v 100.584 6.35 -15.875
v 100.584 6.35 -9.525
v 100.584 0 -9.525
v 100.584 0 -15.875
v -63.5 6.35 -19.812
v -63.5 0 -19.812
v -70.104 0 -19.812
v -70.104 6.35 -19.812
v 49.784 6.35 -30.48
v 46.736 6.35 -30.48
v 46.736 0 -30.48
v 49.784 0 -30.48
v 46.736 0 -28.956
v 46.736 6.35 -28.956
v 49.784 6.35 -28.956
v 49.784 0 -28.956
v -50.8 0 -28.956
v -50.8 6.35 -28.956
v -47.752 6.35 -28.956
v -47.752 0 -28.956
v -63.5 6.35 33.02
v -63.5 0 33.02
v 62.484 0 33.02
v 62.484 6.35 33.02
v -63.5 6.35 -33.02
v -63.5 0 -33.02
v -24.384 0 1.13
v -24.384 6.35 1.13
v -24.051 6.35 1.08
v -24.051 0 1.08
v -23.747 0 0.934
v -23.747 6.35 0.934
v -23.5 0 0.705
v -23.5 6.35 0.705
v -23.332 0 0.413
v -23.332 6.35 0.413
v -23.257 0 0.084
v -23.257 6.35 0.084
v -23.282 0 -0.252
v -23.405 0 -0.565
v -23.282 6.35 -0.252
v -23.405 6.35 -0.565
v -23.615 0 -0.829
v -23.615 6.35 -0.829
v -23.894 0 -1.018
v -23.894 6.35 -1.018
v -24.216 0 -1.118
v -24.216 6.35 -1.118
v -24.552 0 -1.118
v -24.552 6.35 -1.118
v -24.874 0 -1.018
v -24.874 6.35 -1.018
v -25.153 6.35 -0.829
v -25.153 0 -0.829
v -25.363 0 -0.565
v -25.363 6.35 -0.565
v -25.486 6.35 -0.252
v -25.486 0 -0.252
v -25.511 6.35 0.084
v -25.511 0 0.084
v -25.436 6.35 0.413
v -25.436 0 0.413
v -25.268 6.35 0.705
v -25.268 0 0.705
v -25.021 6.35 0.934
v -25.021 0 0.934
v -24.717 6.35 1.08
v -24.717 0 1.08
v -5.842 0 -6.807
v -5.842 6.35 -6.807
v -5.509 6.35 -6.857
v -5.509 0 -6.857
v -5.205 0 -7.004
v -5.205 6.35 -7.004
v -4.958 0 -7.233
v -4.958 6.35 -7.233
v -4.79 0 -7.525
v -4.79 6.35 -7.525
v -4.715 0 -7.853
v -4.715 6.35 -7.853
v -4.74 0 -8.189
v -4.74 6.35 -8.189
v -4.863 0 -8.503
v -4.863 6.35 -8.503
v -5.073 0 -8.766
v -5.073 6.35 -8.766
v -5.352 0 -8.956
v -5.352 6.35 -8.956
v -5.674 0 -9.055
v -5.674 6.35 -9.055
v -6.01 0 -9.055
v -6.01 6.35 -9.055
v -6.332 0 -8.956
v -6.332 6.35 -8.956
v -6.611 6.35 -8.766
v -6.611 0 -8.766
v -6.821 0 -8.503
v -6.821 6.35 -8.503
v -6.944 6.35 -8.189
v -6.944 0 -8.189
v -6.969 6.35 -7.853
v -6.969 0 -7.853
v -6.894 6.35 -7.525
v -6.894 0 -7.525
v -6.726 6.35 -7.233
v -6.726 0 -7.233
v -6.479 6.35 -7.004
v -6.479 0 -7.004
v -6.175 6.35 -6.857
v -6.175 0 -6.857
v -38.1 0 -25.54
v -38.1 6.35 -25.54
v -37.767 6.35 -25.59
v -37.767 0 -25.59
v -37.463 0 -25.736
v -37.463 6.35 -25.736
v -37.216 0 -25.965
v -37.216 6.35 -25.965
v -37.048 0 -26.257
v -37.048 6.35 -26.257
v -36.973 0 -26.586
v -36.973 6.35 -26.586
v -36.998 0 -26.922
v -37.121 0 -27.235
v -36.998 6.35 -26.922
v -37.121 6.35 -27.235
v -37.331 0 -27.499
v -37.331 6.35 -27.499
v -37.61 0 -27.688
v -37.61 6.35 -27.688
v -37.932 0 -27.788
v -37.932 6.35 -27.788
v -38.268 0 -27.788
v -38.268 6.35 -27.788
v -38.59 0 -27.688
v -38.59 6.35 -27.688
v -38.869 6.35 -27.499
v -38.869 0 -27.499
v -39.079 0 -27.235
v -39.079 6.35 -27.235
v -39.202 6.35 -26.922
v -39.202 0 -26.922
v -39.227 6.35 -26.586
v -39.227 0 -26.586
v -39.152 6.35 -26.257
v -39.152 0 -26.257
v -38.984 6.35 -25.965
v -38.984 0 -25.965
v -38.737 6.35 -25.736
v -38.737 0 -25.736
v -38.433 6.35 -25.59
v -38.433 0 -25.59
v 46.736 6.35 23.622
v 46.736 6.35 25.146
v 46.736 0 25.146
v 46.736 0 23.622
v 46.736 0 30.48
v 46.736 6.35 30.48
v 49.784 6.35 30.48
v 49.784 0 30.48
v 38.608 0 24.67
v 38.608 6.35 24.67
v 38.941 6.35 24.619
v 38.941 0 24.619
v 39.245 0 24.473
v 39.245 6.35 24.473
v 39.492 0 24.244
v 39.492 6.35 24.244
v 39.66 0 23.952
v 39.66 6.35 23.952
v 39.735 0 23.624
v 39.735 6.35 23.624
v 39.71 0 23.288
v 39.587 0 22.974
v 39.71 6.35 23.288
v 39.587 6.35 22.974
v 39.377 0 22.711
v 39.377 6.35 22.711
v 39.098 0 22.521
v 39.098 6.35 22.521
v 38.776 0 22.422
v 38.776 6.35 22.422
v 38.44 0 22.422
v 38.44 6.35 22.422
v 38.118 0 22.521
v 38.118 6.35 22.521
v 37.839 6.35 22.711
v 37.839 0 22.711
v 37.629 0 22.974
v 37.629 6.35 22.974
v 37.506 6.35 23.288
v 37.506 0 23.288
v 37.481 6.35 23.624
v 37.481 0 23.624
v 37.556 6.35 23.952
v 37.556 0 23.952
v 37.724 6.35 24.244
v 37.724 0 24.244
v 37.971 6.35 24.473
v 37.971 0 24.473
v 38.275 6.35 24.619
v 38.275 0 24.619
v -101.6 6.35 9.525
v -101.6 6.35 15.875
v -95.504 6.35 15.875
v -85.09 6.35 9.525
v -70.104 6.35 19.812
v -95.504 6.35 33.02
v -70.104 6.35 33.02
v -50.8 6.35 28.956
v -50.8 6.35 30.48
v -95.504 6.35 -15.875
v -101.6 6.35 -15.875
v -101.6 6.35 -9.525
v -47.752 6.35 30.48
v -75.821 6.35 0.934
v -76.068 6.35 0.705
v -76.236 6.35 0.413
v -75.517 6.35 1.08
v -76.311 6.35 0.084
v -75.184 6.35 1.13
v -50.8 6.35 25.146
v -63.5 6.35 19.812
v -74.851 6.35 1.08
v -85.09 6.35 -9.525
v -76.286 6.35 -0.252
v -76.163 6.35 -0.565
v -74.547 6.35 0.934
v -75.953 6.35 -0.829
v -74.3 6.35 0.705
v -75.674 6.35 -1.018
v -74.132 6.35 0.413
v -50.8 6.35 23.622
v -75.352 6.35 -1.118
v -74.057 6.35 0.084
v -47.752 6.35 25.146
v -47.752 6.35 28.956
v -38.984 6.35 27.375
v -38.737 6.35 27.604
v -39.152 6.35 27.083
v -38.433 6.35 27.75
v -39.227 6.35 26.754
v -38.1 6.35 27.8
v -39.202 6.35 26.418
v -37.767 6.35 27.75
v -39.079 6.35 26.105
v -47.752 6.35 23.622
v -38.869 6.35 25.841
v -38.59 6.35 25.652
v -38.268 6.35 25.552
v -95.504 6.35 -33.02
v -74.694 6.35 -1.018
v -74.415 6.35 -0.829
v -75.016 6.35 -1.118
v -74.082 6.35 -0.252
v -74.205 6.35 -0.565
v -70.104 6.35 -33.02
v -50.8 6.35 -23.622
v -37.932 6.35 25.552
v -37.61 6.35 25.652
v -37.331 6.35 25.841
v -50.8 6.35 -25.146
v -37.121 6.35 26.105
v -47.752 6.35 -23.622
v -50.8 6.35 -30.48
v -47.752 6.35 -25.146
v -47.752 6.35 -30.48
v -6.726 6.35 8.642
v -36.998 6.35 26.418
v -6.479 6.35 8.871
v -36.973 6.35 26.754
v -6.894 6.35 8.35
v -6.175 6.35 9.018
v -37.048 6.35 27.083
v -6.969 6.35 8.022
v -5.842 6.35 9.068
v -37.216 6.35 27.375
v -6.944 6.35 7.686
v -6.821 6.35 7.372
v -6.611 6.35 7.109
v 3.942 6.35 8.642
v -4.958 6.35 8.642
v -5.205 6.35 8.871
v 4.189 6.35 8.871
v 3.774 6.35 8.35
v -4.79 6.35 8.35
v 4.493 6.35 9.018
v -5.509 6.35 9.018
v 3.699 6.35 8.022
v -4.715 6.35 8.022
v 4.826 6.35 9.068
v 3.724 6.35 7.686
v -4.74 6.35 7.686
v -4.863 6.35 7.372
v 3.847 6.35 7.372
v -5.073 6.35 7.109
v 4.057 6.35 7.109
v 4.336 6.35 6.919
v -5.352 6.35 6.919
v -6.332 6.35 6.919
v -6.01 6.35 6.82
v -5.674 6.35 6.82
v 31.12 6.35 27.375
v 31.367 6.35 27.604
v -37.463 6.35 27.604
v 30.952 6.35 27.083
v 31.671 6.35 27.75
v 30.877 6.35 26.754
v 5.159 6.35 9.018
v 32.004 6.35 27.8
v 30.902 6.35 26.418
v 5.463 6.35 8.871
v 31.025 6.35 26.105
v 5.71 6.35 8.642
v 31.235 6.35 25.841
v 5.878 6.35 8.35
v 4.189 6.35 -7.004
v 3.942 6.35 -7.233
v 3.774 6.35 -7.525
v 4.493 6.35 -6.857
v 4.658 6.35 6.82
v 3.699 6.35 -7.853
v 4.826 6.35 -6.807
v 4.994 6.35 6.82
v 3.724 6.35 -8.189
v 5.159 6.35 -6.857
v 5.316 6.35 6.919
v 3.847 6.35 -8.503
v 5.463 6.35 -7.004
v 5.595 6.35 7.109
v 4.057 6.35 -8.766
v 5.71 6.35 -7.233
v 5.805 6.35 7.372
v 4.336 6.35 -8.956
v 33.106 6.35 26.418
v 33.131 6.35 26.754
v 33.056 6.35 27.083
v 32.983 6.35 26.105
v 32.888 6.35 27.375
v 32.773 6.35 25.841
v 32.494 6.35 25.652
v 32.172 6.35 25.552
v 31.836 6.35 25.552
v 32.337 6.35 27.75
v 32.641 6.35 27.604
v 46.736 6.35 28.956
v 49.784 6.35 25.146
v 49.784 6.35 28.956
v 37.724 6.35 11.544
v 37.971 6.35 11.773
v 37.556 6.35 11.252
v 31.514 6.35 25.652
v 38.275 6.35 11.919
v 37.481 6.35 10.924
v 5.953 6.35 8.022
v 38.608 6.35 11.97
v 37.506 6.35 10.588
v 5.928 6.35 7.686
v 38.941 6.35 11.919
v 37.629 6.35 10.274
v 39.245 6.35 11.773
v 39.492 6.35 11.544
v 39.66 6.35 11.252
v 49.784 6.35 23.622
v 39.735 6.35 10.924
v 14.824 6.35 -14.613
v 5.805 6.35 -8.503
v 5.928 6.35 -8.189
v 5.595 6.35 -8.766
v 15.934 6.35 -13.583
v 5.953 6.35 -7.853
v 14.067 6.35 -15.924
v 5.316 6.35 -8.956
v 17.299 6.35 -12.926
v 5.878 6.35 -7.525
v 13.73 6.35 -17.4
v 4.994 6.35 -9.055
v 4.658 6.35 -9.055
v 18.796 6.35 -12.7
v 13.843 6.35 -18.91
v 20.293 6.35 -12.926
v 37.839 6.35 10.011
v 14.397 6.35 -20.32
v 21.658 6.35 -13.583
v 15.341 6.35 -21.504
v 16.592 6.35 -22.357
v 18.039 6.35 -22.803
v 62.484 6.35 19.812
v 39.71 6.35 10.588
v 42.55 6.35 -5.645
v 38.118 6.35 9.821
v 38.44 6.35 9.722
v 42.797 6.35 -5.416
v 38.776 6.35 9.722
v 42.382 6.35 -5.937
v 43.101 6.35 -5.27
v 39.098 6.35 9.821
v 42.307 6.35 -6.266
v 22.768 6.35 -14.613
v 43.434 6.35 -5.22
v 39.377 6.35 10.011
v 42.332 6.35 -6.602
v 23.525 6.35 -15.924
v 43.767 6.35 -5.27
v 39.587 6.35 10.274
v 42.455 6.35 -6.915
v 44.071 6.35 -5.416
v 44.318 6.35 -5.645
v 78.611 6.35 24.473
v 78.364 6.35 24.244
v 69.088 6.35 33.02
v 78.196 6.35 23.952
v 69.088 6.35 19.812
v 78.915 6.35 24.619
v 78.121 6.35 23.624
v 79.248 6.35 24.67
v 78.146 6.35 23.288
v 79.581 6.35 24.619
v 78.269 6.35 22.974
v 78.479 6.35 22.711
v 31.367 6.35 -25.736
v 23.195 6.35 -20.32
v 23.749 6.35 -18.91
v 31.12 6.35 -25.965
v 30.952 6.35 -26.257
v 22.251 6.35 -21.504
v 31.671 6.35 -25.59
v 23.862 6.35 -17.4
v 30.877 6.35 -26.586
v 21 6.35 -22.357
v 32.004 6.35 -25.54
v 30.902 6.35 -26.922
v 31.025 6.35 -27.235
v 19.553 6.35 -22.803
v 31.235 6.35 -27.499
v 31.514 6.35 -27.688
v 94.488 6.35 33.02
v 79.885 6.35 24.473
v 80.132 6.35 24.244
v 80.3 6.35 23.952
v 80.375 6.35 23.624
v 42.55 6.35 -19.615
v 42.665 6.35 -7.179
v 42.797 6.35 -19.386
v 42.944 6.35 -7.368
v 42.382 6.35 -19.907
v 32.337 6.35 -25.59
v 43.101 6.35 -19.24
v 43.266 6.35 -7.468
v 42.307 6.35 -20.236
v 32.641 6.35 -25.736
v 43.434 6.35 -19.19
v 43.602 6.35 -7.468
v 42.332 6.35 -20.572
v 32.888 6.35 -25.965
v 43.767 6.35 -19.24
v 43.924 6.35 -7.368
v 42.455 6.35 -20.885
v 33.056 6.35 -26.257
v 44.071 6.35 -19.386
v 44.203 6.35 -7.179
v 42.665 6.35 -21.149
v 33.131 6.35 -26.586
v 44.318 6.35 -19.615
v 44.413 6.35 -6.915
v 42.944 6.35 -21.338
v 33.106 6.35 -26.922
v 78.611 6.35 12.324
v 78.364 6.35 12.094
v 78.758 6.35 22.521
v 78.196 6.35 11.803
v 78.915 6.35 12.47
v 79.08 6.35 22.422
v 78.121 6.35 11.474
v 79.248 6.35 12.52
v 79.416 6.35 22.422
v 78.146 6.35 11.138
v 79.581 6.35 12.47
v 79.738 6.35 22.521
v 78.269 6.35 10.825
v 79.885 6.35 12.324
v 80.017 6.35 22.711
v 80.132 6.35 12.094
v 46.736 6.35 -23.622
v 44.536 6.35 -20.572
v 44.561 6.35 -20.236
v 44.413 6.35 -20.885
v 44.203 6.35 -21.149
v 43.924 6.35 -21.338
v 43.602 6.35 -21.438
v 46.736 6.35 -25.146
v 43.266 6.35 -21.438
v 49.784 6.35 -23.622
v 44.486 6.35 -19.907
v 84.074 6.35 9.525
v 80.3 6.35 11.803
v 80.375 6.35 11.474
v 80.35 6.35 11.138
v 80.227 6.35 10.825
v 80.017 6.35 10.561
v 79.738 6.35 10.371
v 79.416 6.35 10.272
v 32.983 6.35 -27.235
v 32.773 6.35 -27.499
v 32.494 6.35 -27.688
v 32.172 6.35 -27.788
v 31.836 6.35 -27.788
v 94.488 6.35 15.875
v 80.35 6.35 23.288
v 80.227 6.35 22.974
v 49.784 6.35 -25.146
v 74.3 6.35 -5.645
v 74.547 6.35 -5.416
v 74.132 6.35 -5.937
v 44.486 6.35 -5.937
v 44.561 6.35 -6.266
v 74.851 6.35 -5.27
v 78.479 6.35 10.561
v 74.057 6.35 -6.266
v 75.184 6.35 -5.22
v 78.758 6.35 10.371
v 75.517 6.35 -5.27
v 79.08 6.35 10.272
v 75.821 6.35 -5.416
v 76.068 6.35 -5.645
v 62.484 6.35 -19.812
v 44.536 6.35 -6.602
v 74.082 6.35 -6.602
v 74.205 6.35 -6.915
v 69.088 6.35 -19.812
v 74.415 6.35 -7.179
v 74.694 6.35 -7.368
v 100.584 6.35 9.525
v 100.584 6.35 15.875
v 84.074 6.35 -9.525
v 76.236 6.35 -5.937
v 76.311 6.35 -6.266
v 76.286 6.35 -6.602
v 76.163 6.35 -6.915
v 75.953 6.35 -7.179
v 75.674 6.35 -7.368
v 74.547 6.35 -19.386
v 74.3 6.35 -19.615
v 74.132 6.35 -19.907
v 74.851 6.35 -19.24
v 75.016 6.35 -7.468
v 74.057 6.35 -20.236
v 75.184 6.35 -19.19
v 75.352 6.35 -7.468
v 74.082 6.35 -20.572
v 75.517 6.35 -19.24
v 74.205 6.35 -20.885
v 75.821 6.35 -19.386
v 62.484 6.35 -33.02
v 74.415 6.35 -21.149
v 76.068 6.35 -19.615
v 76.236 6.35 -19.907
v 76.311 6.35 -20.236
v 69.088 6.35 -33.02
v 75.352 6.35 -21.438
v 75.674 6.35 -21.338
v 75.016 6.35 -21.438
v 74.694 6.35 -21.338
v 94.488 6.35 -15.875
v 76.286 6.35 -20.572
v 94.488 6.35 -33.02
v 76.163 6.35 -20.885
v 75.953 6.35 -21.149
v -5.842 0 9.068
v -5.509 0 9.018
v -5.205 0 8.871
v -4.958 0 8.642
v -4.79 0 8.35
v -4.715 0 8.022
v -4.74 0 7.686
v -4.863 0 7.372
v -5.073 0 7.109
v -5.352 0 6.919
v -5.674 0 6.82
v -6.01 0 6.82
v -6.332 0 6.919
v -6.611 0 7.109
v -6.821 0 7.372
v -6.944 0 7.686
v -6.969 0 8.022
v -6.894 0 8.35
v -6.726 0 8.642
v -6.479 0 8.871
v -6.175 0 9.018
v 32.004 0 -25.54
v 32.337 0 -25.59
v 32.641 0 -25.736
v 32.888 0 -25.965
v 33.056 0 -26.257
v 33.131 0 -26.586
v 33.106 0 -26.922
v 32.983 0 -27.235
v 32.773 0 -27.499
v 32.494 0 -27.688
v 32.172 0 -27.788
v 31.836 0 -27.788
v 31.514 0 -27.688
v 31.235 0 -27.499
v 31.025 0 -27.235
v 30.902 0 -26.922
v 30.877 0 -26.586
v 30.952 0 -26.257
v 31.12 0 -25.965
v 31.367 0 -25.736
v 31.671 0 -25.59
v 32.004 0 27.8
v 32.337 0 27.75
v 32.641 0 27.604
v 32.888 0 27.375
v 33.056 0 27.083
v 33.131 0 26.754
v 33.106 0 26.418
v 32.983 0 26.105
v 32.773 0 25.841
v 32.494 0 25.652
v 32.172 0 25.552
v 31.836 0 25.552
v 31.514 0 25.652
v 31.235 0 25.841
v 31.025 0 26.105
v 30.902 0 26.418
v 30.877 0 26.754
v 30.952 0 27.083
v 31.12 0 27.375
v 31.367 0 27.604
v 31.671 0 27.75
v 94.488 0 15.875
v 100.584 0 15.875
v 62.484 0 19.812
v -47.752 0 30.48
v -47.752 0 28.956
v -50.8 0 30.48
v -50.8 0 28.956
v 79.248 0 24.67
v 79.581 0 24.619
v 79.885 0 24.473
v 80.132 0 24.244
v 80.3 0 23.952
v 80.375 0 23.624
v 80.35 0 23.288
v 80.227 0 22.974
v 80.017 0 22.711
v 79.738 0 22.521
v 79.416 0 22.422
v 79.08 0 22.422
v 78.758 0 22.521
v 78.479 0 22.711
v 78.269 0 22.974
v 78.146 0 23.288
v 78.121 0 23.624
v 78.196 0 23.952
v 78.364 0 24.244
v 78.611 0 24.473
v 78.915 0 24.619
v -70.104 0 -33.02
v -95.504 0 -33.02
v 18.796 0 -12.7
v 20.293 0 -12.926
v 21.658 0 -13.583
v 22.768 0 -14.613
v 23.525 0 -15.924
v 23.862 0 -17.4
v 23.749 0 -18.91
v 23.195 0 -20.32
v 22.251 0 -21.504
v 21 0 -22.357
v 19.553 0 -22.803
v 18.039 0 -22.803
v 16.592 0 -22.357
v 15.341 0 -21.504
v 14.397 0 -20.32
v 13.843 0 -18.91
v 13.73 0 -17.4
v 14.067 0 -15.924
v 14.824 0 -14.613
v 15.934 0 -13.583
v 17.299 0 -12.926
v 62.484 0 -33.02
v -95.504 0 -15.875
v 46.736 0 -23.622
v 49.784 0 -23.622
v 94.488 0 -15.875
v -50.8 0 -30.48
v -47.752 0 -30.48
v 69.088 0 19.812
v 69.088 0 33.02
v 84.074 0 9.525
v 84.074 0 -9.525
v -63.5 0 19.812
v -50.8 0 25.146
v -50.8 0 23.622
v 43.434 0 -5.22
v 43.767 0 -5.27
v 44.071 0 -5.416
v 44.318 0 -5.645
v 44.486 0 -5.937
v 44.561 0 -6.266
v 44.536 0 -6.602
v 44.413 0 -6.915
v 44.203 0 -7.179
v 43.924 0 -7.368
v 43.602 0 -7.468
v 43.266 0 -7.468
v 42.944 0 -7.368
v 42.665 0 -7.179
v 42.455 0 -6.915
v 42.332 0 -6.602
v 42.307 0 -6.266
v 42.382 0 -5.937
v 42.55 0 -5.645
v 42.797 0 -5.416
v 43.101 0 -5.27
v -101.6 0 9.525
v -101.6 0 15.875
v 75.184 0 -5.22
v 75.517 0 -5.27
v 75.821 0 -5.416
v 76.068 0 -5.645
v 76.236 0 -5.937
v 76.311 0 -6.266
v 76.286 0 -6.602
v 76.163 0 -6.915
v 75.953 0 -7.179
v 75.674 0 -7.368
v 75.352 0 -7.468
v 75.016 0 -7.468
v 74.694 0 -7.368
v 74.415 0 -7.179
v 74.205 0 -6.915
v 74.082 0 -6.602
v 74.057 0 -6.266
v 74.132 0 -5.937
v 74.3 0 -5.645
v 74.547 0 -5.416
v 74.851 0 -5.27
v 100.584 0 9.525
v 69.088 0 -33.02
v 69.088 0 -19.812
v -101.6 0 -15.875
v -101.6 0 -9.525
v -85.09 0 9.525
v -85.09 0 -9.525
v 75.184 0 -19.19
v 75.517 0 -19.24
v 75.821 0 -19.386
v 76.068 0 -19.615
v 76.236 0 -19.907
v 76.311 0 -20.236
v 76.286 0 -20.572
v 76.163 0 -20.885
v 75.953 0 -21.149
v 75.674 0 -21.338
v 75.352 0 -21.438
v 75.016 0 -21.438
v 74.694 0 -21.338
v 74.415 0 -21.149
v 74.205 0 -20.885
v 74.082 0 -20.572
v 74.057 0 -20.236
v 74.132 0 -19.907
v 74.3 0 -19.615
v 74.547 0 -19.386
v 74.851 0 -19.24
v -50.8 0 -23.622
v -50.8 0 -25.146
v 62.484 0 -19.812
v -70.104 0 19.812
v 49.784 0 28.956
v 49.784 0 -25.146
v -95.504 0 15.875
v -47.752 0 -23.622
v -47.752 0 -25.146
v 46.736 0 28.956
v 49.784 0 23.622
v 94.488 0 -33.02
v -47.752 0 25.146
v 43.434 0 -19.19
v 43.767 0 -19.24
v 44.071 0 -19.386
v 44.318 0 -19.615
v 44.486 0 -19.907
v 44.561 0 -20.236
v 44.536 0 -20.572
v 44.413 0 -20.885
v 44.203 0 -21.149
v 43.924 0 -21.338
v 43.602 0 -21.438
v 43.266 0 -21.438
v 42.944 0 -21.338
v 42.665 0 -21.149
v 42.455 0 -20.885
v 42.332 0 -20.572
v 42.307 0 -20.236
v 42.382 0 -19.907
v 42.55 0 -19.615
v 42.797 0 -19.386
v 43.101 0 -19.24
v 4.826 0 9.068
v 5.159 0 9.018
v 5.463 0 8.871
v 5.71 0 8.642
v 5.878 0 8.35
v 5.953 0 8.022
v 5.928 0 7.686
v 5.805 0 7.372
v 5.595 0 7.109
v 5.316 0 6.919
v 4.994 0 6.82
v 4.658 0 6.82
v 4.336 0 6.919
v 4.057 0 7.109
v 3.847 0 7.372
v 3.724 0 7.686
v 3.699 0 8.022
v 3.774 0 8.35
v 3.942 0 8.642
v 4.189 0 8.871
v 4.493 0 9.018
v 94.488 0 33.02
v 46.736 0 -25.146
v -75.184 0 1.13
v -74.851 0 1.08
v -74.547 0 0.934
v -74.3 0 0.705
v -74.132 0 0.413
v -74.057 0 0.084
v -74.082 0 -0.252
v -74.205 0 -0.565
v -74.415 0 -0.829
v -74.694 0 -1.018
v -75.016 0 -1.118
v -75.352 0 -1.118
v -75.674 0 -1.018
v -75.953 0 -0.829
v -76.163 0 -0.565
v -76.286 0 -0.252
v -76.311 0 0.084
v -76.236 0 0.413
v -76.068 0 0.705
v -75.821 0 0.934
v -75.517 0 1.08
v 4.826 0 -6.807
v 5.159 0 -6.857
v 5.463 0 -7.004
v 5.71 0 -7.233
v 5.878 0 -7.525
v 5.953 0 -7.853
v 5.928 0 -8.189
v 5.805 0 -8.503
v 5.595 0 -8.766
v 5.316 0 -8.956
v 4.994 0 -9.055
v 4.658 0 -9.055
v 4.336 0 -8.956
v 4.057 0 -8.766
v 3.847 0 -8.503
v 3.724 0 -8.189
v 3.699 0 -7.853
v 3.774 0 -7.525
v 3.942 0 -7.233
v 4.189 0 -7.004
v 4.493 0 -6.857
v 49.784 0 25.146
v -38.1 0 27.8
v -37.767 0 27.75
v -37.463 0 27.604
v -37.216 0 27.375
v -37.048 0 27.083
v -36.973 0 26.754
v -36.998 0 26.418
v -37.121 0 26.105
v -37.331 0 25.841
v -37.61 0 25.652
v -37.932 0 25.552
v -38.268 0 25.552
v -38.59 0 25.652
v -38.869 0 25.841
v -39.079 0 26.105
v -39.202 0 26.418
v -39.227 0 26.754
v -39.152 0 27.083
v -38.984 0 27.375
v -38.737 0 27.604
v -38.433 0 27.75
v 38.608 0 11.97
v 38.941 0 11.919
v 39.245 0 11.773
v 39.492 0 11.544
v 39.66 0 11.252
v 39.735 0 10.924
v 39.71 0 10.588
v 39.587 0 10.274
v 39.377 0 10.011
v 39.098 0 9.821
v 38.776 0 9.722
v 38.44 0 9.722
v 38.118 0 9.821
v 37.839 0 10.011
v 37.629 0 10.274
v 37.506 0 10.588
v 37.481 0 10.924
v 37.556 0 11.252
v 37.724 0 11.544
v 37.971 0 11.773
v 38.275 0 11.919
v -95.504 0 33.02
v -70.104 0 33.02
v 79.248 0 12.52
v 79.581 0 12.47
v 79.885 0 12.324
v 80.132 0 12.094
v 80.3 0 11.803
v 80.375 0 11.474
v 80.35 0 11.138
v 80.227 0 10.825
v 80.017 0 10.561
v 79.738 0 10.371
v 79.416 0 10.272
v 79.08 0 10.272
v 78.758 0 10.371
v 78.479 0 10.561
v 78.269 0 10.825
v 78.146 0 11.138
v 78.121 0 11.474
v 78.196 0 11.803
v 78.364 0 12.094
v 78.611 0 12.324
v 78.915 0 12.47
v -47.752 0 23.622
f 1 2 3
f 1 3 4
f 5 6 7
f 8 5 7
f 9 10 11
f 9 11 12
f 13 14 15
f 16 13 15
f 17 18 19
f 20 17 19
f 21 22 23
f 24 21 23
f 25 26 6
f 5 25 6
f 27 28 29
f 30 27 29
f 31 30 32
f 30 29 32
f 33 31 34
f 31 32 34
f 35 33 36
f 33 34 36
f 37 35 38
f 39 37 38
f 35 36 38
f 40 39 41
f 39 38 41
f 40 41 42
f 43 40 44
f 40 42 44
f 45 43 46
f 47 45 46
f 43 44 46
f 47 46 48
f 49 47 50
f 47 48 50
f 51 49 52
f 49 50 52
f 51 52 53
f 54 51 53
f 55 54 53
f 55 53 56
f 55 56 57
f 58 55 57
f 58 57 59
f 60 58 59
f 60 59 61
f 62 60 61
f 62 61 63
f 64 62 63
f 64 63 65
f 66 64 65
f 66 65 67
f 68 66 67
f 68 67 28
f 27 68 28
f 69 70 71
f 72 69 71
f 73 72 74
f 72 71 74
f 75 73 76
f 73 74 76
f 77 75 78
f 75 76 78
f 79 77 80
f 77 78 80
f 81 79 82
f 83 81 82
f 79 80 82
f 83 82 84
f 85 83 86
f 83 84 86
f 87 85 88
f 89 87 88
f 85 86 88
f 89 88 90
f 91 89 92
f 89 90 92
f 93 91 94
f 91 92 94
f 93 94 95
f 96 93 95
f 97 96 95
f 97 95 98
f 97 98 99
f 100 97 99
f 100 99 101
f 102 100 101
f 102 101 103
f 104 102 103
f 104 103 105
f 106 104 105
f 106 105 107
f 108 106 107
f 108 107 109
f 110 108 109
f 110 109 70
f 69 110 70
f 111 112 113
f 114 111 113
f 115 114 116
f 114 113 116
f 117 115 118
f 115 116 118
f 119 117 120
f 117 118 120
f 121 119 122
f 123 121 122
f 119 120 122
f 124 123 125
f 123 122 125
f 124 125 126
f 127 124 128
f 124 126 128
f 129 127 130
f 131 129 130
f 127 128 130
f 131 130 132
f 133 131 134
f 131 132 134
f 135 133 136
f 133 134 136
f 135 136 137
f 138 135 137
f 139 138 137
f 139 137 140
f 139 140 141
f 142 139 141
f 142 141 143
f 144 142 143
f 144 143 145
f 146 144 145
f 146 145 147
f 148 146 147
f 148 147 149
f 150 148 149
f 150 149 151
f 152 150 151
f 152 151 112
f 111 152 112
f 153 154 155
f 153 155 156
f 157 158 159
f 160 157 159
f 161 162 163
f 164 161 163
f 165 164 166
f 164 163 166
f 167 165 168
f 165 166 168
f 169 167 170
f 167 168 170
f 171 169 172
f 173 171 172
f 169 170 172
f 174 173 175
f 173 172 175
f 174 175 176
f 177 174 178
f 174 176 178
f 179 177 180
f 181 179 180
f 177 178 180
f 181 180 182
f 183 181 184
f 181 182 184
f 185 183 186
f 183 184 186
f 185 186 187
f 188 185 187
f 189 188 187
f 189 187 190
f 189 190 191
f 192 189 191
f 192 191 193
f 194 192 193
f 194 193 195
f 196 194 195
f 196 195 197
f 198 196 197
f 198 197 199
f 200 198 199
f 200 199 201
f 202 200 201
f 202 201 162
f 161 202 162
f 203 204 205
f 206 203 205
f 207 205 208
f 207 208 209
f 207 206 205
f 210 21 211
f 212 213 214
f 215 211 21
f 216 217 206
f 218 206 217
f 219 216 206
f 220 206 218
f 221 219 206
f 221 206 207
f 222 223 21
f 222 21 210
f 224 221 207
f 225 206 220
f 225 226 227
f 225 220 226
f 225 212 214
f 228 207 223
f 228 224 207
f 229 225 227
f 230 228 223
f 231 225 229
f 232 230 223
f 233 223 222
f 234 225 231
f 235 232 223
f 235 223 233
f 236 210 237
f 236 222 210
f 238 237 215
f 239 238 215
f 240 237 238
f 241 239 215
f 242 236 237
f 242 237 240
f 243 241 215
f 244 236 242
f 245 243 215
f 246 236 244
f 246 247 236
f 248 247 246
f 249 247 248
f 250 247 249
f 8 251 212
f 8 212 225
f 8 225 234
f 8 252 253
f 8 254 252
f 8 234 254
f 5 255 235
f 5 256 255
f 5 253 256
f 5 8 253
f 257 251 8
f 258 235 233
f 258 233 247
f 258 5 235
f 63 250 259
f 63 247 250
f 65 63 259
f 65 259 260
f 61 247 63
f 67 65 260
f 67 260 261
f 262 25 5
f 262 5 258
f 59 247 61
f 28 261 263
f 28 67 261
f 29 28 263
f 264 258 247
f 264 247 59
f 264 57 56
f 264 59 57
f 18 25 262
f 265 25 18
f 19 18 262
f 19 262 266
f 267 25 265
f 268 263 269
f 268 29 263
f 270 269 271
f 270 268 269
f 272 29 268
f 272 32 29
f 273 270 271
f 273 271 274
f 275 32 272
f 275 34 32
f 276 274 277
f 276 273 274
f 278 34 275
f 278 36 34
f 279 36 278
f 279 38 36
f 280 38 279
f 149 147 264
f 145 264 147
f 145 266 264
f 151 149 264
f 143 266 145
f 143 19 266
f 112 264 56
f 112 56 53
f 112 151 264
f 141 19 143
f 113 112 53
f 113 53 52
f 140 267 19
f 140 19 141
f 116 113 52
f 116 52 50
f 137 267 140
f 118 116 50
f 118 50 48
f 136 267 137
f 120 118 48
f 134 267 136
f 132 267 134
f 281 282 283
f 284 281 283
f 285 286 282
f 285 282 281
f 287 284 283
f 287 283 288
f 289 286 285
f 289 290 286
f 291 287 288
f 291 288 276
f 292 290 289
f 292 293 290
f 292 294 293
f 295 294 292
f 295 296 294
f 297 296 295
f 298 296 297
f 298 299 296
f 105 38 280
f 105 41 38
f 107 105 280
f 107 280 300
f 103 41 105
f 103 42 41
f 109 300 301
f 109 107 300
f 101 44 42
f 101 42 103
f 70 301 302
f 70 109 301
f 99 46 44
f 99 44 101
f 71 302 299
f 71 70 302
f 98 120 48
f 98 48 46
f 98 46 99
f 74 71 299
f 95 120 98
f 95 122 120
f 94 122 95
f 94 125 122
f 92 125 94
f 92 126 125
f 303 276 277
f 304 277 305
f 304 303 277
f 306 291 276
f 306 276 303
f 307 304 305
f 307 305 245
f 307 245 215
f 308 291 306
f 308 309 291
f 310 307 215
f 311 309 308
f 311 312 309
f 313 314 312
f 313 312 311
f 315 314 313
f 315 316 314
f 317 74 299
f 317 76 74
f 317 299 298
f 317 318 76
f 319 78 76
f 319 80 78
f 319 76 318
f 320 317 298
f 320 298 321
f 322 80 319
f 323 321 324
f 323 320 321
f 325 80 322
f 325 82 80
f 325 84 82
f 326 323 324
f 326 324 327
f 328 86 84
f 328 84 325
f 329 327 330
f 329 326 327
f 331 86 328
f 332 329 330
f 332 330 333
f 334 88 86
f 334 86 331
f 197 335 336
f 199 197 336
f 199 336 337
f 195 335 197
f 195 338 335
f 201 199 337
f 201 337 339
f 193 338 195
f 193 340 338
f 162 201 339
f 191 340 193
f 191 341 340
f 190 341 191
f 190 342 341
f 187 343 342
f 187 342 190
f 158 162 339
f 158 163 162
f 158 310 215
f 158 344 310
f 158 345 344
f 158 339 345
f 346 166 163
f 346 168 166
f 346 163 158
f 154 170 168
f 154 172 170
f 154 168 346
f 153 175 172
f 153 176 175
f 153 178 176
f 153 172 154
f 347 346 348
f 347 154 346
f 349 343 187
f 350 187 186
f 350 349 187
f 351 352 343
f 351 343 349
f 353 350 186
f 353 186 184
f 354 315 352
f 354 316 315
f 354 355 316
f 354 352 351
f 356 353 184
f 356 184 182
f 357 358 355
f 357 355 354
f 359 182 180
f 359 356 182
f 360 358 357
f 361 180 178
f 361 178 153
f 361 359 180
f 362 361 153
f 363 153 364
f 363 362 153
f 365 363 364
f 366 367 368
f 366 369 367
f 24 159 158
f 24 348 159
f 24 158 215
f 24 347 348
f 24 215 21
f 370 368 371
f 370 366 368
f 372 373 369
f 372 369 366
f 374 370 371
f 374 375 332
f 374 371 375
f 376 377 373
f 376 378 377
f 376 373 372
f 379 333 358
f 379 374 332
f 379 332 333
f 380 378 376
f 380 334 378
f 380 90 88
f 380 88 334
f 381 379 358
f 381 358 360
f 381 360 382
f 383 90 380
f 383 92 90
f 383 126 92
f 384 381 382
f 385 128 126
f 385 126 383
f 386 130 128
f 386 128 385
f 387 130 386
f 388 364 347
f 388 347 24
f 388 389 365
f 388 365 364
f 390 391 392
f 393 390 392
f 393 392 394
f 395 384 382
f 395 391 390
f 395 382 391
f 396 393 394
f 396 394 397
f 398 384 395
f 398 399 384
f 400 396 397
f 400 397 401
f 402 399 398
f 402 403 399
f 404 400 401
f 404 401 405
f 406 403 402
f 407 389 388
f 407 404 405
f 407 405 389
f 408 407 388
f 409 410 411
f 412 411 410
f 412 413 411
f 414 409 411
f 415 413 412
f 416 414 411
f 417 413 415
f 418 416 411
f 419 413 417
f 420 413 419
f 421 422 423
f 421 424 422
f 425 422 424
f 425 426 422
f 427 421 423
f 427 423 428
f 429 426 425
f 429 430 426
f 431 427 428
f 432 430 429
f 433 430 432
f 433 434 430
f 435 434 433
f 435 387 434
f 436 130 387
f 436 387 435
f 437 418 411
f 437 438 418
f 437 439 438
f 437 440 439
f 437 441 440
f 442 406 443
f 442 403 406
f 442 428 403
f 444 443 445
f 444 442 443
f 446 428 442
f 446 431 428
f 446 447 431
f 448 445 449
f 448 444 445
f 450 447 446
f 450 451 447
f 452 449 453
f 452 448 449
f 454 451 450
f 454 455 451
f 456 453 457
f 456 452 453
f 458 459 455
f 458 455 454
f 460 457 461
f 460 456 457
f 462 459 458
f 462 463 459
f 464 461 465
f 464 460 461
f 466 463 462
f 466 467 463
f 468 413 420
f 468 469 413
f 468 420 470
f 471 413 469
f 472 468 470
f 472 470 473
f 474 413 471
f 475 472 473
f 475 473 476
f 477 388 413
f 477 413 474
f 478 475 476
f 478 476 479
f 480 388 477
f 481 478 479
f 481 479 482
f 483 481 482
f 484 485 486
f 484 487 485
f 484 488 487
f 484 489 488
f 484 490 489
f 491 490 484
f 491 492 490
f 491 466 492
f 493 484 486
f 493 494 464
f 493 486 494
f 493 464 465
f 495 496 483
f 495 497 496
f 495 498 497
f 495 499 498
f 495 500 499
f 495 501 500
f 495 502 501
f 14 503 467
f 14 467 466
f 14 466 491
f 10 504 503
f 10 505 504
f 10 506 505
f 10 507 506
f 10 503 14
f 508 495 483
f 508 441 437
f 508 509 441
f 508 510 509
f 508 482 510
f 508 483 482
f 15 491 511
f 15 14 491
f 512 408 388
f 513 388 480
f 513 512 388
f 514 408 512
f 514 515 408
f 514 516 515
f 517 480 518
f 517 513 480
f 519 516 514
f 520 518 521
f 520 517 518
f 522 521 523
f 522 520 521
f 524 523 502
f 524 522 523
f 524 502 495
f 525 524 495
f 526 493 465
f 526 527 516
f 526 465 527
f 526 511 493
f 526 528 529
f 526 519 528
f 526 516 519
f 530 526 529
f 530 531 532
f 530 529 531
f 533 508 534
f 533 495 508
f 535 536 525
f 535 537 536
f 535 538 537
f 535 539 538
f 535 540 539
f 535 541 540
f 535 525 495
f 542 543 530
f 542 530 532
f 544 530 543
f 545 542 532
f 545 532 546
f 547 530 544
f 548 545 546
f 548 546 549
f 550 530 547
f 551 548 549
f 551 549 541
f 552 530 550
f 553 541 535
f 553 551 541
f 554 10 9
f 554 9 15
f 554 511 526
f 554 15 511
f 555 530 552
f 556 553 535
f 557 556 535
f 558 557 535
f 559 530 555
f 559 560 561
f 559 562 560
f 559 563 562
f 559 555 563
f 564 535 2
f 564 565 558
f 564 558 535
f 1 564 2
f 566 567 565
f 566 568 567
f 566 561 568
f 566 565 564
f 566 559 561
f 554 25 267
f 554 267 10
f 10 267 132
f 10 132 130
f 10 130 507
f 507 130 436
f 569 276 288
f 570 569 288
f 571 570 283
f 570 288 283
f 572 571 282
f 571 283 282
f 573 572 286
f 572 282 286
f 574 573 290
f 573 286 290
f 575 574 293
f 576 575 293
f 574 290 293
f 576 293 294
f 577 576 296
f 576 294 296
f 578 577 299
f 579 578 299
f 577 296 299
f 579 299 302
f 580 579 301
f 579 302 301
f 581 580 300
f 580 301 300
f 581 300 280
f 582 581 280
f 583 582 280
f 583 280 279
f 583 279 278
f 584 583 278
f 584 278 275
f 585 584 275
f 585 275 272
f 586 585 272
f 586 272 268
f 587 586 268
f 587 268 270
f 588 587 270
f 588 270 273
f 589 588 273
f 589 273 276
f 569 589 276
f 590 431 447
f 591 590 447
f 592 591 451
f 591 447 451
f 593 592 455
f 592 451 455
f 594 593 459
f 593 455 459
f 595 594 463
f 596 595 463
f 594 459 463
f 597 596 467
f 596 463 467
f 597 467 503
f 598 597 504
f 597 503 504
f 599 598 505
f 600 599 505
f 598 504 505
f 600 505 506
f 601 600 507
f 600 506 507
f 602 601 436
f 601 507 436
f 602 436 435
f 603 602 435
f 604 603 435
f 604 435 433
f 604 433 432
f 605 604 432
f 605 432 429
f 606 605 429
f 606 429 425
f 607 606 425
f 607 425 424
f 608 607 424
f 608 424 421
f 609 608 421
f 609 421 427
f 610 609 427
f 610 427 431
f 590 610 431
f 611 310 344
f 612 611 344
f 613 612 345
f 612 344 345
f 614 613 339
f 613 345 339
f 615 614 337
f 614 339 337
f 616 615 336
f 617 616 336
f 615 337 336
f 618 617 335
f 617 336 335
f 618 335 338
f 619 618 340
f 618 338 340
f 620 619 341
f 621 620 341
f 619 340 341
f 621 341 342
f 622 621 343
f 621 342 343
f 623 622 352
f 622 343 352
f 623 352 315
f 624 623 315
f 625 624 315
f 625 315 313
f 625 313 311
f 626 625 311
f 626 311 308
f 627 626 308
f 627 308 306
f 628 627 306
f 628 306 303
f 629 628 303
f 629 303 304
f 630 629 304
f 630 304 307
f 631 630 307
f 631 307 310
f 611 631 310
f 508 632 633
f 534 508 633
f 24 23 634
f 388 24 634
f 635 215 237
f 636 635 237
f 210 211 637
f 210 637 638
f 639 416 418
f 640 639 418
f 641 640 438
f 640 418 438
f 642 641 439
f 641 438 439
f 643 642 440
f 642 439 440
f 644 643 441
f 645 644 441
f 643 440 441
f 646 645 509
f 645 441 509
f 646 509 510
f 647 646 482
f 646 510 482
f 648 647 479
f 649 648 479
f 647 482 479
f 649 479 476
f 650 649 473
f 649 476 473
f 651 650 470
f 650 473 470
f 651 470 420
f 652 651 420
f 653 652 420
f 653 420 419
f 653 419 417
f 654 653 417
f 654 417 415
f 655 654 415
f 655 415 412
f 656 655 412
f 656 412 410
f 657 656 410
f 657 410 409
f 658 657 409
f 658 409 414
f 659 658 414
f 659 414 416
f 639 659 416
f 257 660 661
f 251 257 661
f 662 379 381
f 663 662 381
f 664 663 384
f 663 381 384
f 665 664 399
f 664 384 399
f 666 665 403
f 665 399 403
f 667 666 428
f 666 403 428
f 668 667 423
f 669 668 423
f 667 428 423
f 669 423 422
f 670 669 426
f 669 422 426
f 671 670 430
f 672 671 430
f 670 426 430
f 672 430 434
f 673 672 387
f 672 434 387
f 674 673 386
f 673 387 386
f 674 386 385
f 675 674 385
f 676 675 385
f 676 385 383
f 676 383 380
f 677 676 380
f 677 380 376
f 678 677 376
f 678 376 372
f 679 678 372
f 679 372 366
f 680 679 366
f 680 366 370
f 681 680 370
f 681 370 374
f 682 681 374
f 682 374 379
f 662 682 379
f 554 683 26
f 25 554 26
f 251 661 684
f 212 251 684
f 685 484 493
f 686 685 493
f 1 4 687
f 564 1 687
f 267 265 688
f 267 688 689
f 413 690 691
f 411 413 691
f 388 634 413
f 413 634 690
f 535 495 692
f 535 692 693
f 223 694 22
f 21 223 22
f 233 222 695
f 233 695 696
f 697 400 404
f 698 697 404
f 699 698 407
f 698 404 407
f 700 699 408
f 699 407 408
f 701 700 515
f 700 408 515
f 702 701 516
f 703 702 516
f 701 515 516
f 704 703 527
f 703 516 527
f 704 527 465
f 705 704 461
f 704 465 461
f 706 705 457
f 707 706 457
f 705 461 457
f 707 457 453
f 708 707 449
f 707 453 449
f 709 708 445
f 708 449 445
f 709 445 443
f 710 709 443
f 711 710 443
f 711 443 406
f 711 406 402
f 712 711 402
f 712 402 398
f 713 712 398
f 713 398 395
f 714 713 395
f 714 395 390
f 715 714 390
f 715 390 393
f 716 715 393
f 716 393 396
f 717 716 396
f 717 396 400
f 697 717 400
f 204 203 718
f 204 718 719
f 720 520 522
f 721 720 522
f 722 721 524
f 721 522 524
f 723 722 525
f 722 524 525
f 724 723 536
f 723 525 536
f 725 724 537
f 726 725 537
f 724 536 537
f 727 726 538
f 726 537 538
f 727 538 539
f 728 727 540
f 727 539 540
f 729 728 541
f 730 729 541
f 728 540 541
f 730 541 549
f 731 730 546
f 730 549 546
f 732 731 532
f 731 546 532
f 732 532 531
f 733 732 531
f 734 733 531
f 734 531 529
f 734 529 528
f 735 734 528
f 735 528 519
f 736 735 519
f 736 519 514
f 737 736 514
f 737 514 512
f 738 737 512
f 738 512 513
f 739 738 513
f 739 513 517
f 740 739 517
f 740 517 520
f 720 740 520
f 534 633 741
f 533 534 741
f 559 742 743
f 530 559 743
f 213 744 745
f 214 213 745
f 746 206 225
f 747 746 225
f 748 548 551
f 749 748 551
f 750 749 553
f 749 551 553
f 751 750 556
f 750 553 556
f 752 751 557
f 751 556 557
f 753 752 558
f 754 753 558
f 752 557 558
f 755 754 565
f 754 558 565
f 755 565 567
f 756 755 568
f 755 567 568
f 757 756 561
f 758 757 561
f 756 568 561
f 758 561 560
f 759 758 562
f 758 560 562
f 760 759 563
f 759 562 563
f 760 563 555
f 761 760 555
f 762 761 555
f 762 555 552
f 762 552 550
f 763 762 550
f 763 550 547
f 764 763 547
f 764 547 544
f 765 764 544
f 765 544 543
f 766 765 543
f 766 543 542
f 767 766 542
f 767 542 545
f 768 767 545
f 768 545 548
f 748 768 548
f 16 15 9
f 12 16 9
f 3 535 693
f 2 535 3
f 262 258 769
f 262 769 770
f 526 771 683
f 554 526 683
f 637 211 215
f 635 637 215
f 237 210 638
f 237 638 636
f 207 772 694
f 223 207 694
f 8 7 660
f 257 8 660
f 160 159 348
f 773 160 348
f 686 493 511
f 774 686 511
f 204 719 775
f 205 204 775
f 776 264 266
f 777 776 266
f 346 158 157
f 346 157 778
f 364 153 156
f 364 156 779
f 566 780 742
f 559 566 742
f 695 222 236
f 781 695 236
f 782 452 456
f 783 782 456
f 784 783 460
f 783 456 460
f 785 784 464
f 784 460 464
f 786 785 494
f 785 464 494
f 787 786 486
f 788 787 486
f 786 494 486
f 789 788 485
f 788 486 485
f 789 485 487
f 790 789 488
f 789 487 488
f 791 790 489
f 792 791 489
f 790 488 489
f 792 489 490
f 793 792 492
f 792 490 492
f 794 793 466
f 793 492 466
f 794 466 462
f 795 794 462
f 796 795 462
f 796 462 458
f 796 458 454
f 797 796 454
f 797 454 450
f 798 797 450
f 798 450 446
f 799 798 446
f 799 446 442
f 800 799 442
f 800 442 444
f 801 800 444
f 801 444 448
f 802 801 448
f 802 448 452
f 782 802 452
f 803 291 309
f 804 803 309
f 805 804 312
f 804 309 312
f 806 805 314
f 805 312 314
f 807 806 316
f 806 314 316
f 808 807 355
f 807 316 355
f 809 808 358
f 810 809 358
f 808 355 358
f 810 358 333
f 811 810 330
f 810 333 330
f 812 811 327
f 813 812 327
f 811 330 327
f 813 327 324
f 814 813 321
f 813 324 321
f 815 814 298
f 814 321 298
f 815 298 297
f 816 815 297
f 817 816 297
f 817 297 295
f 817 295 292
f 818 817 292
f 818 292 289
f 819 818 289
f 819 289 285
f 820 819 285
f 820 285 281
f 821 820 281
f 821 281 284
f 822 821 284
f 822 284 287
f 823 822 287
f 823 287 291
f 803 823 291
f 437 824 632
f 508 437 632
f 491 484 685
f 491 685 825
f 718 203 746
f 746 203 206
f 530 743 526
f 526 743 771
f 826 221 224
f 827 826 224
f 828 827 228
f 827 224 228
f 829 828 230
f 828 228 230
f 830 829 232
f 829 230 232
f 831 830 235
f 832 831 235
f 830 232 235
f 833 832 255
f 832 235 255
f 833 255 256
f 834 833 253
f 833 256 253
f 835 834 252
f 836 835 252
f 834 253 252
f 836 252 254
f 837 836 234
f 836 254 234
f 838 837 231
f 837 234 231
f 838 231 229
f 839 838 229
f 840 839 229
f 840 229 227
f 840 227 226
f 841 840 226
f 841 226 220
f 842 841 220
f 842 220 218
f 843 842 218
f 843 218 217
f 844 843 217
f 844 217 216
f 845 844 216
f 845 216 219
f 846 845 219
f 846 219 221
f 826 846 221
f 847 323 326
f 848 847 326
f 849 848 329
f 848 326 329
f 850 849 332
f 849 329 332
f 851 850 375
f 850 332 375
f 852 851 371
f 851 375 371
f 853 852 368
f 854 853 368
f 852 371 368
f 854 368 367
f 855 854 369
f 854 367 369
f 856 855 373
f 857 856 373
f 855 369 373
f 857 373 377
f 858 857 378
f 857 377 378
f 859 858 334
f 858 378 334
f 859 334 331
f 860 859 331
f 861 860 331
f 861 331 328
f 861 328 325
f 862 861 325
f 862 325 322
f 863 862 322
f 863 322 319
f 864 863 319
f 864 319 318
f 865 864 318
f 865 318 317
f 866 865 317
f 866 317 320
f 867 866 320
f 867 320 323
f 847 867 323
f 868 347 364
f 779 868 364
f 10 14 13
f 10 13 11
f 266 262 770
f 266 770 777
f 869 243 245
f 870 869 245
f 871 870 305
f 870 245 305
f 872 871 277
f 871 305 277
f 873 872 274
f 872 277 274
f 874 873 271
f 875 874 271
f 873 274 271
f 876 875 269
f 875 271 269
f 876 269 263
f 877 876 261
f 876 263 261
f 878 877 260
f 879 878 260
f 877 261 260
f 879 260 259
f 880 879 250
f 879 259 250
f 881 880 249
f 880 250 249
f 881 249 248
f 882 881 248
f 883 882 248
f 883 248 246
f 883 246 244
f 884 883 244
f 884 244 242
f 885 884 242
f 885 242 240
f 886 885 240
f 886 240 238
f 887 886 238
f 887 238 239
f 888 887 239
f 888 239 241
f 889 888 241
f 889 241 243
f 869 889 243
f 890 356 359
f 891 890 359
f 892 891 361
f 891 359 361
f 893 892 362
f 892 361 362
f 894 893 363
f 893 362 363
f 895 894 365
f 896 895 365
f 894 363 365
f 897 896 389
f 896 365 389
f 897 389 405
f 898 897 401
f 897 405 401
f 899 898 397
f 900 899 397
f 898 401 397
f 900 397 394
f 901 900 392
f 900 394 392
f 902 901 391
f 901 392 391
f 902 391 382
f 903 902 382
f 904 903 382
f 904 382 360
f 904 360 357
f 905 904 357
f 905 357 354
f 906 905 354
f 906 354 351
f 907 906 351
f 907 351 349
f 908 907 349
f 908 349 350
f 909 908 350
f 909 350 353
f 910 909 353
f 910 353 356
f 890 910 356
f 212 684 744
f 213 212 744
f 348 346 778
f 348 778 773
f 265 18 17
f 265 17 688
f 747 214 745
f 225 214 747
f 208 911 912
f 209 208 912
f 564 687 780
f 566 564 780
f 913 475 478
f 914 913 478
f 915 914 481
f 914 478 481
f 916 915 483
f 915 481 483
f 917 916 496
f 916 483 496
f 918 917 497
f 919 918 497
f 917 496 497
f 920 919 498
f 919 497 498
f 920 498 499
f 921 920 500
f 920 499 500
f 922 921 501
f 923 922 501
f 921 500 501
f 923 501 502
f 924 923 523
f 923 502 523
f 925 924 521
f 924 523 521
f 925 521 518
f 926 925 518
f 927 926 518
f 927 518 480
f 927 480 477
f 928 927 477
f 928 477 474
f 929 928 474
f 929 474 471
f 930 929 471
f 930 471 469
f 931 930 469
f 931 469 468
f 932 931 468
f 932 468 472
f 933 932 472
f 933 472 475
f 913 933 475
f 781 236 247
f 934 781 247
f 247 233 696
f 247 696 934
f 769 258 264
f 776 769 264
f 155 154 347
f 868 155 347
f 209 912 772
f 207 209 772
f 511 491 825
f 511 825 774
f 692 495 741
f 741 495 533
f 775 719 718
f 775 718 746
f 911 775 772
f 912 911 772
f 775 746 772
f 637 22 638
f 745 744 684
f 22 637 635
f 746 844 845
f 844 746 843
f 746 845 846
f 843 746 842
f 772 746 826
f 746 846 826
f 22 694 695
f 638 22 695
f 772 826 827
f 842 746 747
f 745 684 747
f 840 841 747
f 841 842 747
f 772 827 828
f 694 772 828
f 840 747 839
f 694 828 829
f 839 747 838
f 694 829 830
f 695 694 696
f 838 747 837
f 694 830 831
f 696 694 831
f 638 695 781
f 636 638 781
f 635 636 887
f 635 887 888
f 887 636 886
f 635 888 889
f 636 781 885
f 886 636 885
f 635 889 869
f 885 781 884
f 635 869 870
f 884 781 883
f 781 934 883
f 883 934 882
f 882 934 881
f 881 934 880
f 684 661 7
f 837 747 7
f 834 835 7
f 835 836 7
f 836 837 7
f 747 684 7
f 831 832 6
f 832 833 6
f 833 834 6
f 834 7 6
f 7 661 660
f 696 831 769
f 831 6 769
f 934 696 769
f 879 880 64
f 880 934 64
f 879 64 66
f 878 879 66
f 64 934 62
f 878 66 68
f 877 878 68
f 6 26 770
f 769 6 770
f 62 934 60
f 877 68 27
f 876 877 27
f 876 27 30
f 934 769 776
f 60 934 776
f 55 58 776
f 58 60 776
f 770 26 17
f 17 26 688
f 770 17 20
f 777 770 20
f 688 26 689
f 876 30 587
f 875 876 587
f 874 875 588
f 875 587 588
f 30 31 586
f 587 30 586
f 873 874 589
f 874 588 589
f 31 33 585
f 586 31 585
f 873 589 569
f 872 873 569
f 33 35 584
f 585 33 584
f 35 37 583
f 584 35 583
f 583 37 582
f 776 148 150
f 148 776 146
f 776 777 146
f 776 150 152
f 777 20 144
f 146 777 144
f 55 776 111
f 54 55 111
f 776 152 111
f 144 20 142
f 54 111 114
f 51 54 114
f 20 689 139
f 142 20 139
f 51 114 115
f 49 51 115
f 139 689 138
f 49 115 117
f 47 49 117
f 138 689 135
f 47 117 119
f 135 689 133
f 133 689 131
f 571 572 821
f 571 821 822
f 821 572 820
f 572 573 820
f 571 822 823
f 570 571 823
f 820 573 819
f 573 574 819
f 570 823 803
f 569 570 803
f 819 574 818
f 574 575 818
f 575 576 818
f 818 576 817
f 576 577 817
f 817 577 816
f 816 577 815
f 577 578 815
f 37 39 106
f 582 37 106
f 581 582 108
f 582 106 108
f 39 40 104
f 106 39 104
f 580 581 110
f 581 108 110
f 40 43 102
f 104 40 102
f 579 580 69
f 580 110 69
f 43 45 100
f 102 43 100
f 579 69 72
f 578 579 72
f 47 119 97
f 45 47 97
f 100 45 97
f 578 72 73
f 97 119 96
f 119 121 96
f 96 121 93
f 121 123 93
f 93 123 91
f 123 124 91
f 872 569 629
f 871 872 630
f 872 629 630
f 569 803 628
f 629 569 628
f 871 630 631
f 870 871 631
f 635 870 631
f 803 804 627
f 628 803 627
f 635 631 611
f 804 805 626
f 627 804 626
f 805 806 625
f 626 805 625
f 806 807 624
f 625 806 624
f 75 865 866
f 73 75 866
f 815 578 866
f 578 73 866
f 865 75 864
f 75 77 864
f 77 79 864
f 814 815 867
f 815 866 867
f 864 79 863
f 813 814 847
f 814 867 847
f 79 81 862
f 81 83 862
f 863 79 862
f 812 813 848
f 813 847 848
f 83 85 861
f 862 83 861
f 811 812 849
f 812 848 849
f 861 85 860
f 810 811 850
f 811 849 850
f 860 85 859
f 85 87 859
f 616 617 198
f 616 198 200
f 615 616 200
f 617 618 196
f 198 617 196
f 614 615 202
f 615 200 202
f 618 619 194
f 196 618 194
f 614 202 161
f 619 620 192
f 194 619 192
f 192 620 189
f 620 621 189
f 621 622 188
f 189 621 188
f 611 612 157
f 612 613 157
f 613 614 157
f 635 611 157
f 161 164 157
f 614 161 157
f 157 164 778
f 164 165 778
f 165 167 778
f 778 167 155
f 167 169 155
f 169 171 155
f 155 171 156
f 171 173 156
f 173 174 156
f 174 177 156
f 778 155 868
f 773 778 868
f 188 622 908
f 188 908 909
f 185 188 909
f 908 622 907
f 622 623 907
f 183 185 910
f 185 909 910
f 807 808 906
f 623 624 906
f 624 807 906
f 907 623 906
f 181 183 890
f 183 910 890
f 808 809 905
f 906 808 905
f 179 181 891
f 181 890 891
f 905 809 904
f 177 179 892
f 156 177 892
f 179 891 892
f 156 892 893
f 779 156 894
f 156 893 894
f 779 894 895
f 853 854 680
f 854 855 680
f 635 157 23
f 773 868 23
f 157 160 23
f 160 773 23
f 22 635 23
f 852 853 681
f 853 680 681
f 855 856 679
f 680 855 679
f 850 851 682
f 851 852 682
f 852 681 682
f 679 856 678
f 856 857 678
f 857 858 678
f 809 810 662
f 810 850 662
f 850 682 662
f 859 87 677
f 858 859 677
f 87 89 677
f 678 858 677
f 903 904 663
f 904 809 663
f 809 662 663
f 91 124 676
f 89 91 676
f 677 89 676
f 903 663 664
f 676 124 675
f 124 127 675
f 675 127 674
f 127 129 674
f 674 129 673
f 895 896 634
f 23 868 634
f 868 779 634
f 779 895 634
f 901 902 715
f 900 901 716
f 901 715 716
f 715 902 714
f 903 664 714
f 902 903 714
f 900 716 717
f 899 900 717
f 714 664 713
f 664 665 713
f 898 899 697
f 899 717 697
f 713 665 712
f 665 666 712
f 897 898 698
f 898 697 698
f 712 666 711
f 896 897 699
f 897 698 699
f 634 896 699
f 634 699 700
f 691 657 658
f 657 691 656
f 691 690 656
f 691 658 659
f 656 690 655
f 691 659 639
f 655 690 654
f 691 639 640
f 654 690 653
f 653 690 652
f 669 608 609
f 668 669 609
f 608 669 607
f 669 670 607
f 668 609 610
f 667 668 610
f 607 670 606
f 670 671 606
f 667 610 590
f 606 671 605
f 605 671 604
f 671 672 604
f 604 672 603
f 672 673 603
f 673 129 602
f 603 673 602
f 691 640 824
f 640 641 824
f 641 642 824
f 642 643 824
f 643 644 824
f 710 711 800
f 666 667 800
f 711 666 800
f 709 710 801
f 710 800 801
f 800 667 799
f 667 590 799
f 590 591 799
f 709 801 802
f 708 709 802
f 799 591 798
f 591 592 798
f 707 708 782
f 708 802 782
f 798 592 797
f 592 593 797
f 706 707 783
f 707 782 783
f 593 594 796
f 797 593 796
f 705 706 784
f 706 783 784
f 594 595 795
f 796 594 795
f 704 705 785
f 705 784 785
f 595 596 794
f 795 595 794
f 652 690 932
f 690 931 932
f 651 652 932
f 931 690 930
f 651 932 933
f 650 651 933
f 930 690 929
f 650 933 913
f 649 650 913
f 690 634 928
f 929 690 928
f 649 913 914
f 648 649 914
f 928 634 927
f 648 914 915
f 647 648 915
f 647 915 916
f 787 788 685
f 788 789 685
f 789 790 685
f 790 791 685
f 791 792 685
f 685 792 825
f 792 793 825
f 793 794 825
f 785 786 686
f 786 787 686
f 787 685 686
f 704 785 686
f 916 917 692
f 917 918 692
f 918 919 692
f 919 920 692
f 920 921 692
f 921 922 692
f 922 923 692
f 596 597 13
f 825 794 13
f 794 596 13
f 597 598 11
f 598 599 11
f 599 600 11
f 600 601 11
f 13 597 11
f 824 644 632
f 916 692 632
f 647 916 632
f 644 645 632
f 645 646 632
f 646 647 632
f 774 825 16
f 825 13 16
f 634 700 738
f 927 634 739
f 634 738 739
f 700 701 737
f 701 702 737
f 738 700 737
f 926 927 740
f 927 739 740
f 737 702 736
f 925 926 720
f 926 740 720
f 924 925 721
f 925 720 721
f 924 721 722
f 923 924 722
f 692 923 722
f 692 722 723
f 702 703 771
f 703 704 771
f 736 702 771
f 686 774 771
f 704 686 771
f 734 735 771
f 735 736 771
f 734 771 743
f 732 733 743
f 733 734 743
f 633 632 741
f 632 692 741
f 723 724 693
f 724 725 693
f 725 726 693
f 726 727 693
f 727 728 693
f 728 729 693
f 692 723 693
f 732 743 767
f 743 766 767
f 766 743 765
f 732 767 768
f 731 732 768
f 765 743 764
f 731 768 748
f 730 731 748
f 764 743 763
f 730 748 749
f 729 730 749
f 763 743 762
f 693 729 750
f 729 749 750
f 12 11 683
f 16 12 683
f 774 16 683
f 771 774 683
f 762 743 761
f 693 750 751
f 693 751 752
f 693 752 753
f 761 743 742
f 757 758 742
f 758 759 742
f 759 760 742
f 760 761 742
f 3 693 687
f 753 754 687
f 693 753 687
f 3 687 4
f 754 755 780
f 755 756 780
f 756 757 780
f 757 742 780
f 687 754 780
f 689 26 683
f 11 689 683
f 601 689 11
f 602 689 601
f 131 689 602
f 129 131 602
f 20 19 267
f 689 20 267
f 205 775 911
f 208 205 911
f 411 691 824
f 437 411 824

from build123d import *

# Parameters (mm, degrees)
BOSS_EXTRUDE1_DEPTH = 6.35
SKETCH2_R           = 1.1303
CUT_EXTRUDE1_DEPTH  = 10.16
SKETCH3_R           = 5.08
SKETCH3_W           = 3.048
SKETCH3_H           = 1.524
CUT_EXTRUDE2_DEPTH  = 10.16
SKETCH4_R           = 1.1303
CUT_EXTRUDE3_DEPTH  = 10.16
SKETCH5_W           = 16.51
SKETCH5_H           = 19.05
CUT_EXTRUDE4_DEPTH  = 10.16


with BuildPart() as part:
    # Sketch1 → Boss-Extrude1 (new body)
    with BuildSketch(Plane(origin=(0, 0, 0), x_dir=(1, 0, 0), z_dir=(0, 1, 0))):
        Polygon((-95.504, 15.875), (-101.6, 15.875), (-101.6, -15.875), (-95.504, -15.875), (-95.504, -33.02), (-70.104, -33.02), (-70.104, -19.812), (-63.5, -19.812), (-63.5, -33.02), (2.794, -33.02), (9.398, -33.02), (62.484, -33.02), (62.484, -19.812), (69.088, -19.812), (69.088, -33.02), (94.488, -33.02), (94.488, -15.875), (100.584, -15.875), (100.584, 15.875), (94.488, 15.875), (94.488, 33.02), (69.088, 33.02), (69.088, 19.812), (62.484, 19.812), (62.484, 33.02), (9.398, 33.02), (2.794, 33.02), (-63.5, 33.02), (-63.5, 19.812), (-70.104, 19.812), (-70.104, 33.02), (-95.504, 33.02), align=None)
    extrude(amount=BOSS_EXTRUDE1_DEPTH)

    # Sketch2 → Cut-Extrude1 (cut)
    with BuildSketch(Plane(origin=(0, 6.35, 0), x_dir=(1, 0, 0), z_dir=(0, 1, 0))):
        with Locations(Location((-5.842, 7.9375, 0), (0, 0, 270))):
            Circle(SKETCH2_R)
        with Locations(Location((4.826, 7.9375, 0), (0, 0, 270))):
            Circle(SKETCH2_R)
        with Locations(Location((4.826, -7.9375, 0), (0, 0, 270))):
            Circle(SKETCH2_R)
        with Locations(Location((-5.842, -7.9375, 0), (0, 0, 270))):
            Circle(SKETCH2_R)
        with Locations(Location((-75.184, 0, 0), (0, 0, 270))):
            Circle(SKETCH2_R)
        with Locations(Location((-24.384, 0, 0), (0, 0, 270))):
            Circle(SKETCH2_R)
        with Locations(Location((43.434, 20.32, 0), (0, 0, 270))):
            Circle(SKETCH2_R)
        with Locations(Location((75.184, 20.32, 0), (0, 0, 270))):
            Circle(SKETCH2_R)
        with Locations(Location((75.184, 6.35, 0), (0, 0, 270))):
            Circle(SKETCH2_R)
        with Locations(Location((43.434, 6.35, 0), (0, 0, 270))):
            Circle(SKETCH2_R)
        with Locations(Location((38.608, -10.839373847, 0), (0, 0, 270))):
            Circle(SKETCH2_R)
        with Locations(Location((79.248, -11.389700319, 0), (0, 0, 270))):
            Circle(SKETCH2_R)
        with Locations(Location((38.608, -23.539373847, 0), (0, 0, 270))):
            Circle(SKETCH2_R)
        with Locations(Location((79.248, -23.539373847, 0), (0, 0, 270))):
            Circle(SKETCH2_R)
    extrude(amount=-CUT_EXTRUDE1_DEPTH, mode=Mode.SUBTRACT)

    # Sketch3 → Cut-Extrude2 (cut)
    with BuildSketch(Plane(origin=(0, 6.35, 0), x_dir=(1, 0, 0), z_dir=(0, 1, 0))):
        with Locations(Location((18.796, 17.78, 0), (0, 0, 270))):
            Circle(SKETCH3_R)
        with Locations((-49.276, 29.718)):
            Rectangle(SKETCH3_W, SKETCH3_H)
        with Locations((-49.276, 24.384)):
            Rectangle(SKETCH3_W, SKETCH3_H)
        with Locations((48.26, 29.718)):
            Rectangle(SKETCH3_W, SKETCH3_H)
        with Locations((48.26, 24.384)):
            Rectangle(SKETCH3_W, SKETCH3_H)
        with Locations((-49.276, -24.384)):
            Rectangle(SKETCH3_W, SKETCH3_H)
        with Locations((-49.276, -29.718)):
            Rectangle(SKETCH3_W, SKETCH3_H)
        with Locations((48.26, -24.384)):
            Rectangle(SKETCH3_W, SKETCH3_H)
        with Locations((48.26, -29.718)):
            Rectangle(SKETCH3_W, SKETCH3_H)
    extrude(amount=-CUT_EXTRUDE2_DEPTH, mode=Mode.SUBTRACT)

    # Sketch4 → Cut-Extrude3 (cut)
    with BuildSketch(Plane(origin=(0, 6.35, 0), x_dir=(1, 0, 0), z_dir=(0, 1, 0))):
        with Locations(Location((-38.1, 26.67, 0), (0, 0, 270))):
            Circle(SKETCH4_R)
        with Locations(Location((32.004, 26.67, 0), (0, 0, 270))):
            Circle(SKETCH4_R)
        with Locations(Location((-38.1, -26.67, 0), (0, 0, 270))):
            Circle(SKETCH4_R)
        with Locations(Location((32.004, -26.67, 0), (0, 0, 270))):
            Circle(SKETCH4_R)
    extrude(amount=-CUT_EXTRUDE3_DEPTH, mode=Mode.SUBTRACT)

    # Sketch5 → Cut-Extrude4 (cut)
    with BuildSketch(Plane(origin=(0, 6.35, 0), x_dir=(1, 0, 0), z_dir=(0, 1, 0))):
        with Locations((-93.345, 0)):
            Rectangle(SKETCH5_W, SKETCH5_H)
        with Locations((92.329, 0)):
            Rectangle(SKETCH5_W, SKETCH5_H)
    extrude(amount=-CUT_EXTRUDE4_DEPTH, mode=Mode.SUBTRACT)


solid = part.part
